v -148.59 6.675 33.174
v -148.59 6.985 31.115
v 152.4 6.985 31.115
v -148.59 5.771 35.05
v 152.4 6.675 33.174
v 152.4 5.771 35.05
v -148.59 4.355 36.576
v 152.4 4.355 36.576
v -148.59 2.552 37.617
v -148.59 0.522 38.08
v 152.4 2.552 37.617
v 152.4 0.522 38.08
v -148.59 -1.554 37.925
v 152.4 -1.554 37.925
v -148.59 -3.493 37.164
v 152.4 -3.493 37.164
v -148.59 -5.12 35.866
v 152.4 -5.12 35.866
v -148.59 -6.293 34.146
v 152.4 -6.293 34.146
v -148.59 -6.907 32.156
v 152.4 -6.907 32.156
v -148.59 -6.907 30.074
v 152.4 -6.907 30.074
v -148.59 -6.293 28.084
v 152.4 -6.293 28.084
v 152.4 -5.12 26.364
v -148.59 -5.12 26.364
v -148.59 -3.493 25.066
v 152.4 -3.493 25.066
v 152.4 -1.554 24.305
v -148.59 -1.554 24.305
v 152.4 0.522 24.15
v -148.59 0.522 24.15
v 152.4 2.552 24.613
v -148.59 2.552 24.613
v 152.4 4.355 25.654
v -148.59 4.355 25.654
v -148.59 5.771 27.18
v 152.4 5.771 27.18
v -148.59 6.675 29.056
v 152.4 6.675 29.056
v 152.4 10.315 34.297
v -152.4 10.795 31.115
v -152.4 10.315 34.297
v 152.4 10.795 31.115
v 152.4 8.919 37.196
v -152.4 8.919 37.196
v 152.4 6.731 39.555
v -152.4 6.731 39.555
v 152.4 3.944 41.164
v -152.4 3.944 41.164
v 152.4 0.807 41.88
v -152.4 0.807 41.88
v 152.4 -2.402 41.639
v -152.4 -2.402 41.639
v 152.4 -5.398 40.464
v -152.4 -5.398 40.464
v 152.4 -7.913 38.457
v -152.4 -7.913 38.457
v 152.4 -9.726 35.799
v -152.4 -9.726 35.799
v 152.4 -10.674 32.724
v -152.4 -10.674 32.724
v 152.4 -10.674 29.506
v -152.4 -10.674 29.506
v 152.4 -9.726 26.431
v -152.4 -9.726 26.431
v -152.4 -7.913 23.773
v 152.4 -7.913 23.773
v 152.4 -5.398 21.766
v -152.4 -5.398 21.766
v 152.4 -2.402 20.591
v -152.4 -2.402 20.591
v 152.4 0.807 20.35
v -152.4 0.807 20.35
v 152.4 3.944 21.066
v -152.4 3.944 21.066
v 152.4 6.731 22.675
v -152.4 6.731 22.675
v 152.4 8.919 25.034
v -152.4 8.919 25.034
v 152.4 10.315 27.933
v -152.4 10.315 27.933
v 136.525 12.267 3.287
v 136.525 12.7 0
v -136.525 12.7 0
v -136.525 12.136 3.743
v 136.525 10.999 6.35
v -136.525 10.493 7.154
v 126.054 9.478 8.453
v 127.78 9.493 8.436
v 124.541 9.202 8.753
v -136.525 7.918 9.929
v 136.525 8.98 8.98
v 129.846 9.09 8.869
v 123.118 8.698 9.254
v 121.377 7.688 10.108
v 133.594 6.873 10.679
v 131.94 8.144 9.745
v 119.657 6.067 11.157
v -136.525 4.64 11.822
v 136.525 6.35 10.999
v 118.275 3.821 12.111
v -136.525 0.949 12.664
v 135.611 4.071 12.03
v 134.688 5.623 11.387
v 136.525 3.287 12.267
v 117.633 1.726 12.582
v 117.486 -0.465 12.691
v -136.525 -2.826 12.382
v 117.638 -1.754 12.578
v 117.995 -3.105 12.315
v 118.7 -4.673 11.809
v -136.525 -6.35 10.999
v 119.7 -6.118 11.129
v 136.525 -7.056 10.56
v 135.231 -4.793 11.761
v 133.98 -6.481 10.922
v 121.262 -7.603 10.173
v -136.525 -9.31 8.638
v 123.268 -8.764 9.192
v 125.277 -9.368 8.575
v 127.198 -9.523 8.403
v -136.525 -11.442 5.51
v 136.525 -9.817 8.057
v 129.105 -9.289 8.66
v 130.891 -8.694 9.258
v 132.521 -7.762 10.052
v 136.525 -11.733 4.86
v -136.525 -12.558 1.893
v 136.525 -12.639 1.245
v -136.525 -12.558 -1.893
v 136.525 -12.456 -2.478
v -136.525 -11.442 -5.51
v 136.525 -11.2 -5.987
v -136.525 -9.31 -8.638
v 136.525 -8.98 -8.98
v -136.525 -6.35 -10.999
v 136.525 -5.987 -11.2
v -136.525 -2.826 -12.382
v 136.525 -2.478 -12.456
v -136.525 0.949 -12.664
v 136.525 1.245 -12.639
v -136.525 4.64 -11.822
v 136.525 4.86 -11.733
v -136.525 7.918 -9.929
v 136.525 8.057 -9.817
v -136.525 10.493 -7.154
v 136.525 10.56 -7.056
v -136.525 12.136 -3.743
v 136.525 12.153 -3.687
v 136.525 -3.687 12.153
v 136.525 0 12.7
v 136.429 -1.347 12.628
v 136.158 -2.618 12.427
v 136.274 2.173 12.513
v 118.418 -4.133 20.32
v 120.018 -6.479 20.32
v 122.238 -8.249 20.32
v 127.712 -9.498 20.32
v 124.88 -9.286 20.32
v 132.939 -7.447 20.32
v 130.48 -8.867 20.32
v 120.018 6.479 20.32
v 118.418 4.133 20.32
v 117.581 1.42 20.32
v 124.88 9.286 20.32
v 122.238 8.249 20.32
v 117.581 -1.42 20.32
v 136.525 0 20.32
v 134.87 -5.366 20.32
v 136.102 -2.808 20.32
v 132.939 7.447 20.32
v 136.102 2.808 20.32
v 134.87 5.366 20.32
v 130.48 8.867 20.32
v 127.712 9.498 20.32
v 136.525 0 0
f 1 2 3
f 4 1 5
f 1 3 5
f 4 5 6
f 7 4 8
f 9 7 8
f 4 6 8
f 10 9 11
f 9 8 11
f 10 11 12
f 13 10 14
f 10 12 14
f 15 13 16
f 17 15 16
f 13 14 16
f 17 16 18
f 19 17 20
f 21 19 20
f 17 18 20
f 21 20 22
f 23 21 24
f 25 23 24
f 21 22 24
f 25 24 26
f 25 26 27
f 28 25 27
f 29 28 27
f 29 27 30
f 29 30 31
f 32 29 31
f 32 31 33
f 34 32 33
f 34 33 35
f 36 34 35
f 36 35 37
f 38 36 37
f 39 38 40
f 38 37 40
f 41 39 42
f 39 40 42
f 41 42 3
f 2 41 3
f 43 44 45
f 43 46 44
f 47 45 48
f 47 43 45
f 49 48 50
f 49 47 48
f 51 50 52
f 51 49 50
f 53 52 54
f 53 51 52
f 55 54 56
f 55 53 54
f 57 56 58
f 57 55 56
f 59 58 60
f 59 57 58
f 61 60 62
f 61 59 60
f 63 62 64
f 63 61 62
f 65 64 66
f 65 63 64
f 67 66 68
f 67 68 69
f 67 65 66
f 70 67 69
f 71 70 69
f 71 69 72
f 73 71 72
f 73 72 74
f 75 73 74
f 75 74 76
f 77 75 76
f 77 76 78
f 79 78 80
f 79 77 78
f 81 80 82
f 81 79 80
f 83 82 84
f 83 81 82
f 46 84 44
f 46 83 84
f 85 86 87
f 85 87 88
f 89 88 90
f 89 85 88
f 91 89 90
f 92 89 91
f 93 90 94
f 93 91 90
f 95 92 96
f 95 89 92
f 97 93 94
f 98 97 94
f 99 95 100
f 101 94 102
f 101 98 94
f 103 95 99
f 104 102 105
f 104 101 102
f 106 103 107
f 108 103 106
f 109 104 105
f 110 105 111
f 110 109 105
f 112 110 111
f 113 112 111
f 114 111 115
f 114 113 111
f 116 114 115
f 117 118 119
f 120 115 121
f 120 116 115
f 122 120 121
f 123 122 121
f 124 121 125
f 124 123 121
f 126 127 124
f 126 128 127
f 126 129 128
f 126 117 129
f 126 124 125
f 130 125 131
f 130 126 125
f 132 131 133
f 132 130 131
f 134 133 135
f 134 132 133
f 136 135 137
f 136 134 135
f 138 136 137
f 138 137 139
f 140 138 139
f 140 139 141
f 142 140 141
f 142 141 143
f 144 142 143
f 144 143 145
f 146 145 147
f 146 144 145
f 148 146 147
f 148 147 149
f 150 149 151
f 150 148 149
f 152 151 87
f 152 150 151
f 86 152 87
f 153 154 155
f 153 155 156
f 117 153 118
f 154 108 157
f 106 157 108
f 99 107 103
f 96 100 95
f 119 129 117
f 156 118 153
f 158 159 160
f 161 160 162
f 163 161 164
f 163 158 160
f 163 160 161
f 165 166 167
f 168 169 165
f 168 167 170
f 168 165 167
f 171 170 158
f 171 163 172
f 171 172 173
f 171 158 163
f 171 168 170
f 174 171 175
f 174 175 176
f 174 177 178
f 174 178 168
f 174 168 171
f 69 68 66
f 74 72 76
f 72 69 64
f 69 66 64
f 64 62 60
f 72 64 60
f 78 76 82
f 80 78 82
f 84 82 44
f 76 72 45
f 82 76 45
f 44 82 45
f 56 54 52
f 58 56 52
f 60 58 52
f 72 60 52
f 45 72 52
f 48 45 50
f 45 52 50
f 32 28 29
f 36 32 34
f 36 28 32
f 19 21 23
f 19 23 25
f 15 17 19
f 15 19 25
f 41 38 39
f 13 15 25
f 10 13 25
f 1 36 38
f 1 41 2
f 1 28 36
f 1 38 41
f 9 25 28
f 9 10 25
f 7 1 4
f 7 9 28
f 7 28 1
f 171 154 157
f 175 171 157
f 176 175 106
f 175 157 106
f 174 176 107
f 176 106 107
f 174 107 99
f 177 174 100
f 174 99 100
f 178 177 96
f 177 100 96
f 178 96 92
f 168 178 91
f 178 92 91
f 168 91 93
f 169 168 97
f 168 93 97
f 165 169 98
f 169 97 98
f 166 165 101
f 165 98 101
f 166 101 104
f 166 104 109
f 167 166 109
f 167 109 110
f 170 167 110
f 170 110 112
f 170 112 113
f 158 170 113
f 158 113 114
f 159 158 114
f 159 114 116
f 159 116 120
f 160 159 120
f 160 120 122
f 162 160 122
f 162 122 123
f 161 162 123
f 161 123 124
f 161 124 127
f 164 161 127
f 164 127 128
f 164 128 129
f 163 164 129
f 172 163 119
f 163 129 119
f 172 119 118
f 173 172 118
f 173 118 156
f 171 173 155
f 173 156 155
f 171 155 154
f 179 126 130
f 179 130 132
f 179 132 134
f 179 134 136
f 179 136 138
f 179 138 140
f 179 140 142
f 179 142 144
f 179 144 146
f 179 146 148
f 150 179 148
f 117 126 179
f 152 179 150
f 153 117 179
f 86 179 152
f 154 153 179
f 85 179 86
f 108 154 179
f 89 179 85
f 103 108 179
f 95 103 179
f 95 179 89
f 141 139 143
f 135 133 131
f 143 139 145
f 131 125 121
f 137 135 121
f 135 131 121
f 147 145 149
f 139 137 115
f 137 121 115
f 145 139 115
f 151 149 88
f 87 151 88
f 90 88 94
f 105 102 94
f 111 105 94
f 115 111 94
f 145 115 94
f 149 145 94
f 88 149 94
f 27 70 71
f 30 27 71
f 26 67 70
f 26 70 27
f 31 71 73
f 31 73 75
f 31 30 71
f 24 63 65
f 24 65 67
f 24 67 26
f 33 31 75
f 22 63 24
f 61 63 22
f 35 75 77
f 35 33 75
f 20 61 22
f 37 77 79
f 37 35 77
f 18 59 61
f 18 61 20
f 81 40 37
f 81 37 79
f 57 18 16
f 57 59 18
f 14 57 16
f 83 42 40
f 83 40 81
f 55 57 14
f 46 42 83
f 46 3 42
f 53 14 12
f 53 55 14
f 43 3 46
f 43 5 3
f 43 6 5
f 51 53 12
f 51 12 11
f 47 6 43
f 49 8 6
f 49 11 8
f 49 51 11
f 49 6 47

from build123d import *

# Parameters (mm, degrees)
F0_R     = 12.7
F1_DEPTH = 136.525
F2_R     = 9.525
F3_DEPTH = 20.32
F4_R     = 10.795
F5_DEPTH = 152.4
F6_T     = -3.81


with BuildPart() as f1:
    # F0 (on Right) → F1 (new body, symmetric)
    with BuildSketch(Plane.YZ):
        Circle(F0_R)
    extrude(amount=F1_DEPTH, both=True)

    # F2 (on Top) → F3 (join)
    with BuildSketch(Plane.XY):
        with Locations((127, 0)):
            Circle(F2_R)
    extrude(amount=F3_DEPTH)


with BuildPart() as f5:
    # F4 (on Right) → F5 (new body, symmetric)
    with BuildSketch(Plane.YZ):
        with Locations((0, 31.115)):
            Circle(F4_R)
    extrude(amount=F5_DEPTH, both=True)

    # F6
    f6_openings = [f5.faces().sort_by_distance(p)[0] for p in [
        (152.4, 0, 31.115),
    ]]
    offset(amount=F6_T, openings=f6_openings)


solid = Compound([f1.part, f5.part])
